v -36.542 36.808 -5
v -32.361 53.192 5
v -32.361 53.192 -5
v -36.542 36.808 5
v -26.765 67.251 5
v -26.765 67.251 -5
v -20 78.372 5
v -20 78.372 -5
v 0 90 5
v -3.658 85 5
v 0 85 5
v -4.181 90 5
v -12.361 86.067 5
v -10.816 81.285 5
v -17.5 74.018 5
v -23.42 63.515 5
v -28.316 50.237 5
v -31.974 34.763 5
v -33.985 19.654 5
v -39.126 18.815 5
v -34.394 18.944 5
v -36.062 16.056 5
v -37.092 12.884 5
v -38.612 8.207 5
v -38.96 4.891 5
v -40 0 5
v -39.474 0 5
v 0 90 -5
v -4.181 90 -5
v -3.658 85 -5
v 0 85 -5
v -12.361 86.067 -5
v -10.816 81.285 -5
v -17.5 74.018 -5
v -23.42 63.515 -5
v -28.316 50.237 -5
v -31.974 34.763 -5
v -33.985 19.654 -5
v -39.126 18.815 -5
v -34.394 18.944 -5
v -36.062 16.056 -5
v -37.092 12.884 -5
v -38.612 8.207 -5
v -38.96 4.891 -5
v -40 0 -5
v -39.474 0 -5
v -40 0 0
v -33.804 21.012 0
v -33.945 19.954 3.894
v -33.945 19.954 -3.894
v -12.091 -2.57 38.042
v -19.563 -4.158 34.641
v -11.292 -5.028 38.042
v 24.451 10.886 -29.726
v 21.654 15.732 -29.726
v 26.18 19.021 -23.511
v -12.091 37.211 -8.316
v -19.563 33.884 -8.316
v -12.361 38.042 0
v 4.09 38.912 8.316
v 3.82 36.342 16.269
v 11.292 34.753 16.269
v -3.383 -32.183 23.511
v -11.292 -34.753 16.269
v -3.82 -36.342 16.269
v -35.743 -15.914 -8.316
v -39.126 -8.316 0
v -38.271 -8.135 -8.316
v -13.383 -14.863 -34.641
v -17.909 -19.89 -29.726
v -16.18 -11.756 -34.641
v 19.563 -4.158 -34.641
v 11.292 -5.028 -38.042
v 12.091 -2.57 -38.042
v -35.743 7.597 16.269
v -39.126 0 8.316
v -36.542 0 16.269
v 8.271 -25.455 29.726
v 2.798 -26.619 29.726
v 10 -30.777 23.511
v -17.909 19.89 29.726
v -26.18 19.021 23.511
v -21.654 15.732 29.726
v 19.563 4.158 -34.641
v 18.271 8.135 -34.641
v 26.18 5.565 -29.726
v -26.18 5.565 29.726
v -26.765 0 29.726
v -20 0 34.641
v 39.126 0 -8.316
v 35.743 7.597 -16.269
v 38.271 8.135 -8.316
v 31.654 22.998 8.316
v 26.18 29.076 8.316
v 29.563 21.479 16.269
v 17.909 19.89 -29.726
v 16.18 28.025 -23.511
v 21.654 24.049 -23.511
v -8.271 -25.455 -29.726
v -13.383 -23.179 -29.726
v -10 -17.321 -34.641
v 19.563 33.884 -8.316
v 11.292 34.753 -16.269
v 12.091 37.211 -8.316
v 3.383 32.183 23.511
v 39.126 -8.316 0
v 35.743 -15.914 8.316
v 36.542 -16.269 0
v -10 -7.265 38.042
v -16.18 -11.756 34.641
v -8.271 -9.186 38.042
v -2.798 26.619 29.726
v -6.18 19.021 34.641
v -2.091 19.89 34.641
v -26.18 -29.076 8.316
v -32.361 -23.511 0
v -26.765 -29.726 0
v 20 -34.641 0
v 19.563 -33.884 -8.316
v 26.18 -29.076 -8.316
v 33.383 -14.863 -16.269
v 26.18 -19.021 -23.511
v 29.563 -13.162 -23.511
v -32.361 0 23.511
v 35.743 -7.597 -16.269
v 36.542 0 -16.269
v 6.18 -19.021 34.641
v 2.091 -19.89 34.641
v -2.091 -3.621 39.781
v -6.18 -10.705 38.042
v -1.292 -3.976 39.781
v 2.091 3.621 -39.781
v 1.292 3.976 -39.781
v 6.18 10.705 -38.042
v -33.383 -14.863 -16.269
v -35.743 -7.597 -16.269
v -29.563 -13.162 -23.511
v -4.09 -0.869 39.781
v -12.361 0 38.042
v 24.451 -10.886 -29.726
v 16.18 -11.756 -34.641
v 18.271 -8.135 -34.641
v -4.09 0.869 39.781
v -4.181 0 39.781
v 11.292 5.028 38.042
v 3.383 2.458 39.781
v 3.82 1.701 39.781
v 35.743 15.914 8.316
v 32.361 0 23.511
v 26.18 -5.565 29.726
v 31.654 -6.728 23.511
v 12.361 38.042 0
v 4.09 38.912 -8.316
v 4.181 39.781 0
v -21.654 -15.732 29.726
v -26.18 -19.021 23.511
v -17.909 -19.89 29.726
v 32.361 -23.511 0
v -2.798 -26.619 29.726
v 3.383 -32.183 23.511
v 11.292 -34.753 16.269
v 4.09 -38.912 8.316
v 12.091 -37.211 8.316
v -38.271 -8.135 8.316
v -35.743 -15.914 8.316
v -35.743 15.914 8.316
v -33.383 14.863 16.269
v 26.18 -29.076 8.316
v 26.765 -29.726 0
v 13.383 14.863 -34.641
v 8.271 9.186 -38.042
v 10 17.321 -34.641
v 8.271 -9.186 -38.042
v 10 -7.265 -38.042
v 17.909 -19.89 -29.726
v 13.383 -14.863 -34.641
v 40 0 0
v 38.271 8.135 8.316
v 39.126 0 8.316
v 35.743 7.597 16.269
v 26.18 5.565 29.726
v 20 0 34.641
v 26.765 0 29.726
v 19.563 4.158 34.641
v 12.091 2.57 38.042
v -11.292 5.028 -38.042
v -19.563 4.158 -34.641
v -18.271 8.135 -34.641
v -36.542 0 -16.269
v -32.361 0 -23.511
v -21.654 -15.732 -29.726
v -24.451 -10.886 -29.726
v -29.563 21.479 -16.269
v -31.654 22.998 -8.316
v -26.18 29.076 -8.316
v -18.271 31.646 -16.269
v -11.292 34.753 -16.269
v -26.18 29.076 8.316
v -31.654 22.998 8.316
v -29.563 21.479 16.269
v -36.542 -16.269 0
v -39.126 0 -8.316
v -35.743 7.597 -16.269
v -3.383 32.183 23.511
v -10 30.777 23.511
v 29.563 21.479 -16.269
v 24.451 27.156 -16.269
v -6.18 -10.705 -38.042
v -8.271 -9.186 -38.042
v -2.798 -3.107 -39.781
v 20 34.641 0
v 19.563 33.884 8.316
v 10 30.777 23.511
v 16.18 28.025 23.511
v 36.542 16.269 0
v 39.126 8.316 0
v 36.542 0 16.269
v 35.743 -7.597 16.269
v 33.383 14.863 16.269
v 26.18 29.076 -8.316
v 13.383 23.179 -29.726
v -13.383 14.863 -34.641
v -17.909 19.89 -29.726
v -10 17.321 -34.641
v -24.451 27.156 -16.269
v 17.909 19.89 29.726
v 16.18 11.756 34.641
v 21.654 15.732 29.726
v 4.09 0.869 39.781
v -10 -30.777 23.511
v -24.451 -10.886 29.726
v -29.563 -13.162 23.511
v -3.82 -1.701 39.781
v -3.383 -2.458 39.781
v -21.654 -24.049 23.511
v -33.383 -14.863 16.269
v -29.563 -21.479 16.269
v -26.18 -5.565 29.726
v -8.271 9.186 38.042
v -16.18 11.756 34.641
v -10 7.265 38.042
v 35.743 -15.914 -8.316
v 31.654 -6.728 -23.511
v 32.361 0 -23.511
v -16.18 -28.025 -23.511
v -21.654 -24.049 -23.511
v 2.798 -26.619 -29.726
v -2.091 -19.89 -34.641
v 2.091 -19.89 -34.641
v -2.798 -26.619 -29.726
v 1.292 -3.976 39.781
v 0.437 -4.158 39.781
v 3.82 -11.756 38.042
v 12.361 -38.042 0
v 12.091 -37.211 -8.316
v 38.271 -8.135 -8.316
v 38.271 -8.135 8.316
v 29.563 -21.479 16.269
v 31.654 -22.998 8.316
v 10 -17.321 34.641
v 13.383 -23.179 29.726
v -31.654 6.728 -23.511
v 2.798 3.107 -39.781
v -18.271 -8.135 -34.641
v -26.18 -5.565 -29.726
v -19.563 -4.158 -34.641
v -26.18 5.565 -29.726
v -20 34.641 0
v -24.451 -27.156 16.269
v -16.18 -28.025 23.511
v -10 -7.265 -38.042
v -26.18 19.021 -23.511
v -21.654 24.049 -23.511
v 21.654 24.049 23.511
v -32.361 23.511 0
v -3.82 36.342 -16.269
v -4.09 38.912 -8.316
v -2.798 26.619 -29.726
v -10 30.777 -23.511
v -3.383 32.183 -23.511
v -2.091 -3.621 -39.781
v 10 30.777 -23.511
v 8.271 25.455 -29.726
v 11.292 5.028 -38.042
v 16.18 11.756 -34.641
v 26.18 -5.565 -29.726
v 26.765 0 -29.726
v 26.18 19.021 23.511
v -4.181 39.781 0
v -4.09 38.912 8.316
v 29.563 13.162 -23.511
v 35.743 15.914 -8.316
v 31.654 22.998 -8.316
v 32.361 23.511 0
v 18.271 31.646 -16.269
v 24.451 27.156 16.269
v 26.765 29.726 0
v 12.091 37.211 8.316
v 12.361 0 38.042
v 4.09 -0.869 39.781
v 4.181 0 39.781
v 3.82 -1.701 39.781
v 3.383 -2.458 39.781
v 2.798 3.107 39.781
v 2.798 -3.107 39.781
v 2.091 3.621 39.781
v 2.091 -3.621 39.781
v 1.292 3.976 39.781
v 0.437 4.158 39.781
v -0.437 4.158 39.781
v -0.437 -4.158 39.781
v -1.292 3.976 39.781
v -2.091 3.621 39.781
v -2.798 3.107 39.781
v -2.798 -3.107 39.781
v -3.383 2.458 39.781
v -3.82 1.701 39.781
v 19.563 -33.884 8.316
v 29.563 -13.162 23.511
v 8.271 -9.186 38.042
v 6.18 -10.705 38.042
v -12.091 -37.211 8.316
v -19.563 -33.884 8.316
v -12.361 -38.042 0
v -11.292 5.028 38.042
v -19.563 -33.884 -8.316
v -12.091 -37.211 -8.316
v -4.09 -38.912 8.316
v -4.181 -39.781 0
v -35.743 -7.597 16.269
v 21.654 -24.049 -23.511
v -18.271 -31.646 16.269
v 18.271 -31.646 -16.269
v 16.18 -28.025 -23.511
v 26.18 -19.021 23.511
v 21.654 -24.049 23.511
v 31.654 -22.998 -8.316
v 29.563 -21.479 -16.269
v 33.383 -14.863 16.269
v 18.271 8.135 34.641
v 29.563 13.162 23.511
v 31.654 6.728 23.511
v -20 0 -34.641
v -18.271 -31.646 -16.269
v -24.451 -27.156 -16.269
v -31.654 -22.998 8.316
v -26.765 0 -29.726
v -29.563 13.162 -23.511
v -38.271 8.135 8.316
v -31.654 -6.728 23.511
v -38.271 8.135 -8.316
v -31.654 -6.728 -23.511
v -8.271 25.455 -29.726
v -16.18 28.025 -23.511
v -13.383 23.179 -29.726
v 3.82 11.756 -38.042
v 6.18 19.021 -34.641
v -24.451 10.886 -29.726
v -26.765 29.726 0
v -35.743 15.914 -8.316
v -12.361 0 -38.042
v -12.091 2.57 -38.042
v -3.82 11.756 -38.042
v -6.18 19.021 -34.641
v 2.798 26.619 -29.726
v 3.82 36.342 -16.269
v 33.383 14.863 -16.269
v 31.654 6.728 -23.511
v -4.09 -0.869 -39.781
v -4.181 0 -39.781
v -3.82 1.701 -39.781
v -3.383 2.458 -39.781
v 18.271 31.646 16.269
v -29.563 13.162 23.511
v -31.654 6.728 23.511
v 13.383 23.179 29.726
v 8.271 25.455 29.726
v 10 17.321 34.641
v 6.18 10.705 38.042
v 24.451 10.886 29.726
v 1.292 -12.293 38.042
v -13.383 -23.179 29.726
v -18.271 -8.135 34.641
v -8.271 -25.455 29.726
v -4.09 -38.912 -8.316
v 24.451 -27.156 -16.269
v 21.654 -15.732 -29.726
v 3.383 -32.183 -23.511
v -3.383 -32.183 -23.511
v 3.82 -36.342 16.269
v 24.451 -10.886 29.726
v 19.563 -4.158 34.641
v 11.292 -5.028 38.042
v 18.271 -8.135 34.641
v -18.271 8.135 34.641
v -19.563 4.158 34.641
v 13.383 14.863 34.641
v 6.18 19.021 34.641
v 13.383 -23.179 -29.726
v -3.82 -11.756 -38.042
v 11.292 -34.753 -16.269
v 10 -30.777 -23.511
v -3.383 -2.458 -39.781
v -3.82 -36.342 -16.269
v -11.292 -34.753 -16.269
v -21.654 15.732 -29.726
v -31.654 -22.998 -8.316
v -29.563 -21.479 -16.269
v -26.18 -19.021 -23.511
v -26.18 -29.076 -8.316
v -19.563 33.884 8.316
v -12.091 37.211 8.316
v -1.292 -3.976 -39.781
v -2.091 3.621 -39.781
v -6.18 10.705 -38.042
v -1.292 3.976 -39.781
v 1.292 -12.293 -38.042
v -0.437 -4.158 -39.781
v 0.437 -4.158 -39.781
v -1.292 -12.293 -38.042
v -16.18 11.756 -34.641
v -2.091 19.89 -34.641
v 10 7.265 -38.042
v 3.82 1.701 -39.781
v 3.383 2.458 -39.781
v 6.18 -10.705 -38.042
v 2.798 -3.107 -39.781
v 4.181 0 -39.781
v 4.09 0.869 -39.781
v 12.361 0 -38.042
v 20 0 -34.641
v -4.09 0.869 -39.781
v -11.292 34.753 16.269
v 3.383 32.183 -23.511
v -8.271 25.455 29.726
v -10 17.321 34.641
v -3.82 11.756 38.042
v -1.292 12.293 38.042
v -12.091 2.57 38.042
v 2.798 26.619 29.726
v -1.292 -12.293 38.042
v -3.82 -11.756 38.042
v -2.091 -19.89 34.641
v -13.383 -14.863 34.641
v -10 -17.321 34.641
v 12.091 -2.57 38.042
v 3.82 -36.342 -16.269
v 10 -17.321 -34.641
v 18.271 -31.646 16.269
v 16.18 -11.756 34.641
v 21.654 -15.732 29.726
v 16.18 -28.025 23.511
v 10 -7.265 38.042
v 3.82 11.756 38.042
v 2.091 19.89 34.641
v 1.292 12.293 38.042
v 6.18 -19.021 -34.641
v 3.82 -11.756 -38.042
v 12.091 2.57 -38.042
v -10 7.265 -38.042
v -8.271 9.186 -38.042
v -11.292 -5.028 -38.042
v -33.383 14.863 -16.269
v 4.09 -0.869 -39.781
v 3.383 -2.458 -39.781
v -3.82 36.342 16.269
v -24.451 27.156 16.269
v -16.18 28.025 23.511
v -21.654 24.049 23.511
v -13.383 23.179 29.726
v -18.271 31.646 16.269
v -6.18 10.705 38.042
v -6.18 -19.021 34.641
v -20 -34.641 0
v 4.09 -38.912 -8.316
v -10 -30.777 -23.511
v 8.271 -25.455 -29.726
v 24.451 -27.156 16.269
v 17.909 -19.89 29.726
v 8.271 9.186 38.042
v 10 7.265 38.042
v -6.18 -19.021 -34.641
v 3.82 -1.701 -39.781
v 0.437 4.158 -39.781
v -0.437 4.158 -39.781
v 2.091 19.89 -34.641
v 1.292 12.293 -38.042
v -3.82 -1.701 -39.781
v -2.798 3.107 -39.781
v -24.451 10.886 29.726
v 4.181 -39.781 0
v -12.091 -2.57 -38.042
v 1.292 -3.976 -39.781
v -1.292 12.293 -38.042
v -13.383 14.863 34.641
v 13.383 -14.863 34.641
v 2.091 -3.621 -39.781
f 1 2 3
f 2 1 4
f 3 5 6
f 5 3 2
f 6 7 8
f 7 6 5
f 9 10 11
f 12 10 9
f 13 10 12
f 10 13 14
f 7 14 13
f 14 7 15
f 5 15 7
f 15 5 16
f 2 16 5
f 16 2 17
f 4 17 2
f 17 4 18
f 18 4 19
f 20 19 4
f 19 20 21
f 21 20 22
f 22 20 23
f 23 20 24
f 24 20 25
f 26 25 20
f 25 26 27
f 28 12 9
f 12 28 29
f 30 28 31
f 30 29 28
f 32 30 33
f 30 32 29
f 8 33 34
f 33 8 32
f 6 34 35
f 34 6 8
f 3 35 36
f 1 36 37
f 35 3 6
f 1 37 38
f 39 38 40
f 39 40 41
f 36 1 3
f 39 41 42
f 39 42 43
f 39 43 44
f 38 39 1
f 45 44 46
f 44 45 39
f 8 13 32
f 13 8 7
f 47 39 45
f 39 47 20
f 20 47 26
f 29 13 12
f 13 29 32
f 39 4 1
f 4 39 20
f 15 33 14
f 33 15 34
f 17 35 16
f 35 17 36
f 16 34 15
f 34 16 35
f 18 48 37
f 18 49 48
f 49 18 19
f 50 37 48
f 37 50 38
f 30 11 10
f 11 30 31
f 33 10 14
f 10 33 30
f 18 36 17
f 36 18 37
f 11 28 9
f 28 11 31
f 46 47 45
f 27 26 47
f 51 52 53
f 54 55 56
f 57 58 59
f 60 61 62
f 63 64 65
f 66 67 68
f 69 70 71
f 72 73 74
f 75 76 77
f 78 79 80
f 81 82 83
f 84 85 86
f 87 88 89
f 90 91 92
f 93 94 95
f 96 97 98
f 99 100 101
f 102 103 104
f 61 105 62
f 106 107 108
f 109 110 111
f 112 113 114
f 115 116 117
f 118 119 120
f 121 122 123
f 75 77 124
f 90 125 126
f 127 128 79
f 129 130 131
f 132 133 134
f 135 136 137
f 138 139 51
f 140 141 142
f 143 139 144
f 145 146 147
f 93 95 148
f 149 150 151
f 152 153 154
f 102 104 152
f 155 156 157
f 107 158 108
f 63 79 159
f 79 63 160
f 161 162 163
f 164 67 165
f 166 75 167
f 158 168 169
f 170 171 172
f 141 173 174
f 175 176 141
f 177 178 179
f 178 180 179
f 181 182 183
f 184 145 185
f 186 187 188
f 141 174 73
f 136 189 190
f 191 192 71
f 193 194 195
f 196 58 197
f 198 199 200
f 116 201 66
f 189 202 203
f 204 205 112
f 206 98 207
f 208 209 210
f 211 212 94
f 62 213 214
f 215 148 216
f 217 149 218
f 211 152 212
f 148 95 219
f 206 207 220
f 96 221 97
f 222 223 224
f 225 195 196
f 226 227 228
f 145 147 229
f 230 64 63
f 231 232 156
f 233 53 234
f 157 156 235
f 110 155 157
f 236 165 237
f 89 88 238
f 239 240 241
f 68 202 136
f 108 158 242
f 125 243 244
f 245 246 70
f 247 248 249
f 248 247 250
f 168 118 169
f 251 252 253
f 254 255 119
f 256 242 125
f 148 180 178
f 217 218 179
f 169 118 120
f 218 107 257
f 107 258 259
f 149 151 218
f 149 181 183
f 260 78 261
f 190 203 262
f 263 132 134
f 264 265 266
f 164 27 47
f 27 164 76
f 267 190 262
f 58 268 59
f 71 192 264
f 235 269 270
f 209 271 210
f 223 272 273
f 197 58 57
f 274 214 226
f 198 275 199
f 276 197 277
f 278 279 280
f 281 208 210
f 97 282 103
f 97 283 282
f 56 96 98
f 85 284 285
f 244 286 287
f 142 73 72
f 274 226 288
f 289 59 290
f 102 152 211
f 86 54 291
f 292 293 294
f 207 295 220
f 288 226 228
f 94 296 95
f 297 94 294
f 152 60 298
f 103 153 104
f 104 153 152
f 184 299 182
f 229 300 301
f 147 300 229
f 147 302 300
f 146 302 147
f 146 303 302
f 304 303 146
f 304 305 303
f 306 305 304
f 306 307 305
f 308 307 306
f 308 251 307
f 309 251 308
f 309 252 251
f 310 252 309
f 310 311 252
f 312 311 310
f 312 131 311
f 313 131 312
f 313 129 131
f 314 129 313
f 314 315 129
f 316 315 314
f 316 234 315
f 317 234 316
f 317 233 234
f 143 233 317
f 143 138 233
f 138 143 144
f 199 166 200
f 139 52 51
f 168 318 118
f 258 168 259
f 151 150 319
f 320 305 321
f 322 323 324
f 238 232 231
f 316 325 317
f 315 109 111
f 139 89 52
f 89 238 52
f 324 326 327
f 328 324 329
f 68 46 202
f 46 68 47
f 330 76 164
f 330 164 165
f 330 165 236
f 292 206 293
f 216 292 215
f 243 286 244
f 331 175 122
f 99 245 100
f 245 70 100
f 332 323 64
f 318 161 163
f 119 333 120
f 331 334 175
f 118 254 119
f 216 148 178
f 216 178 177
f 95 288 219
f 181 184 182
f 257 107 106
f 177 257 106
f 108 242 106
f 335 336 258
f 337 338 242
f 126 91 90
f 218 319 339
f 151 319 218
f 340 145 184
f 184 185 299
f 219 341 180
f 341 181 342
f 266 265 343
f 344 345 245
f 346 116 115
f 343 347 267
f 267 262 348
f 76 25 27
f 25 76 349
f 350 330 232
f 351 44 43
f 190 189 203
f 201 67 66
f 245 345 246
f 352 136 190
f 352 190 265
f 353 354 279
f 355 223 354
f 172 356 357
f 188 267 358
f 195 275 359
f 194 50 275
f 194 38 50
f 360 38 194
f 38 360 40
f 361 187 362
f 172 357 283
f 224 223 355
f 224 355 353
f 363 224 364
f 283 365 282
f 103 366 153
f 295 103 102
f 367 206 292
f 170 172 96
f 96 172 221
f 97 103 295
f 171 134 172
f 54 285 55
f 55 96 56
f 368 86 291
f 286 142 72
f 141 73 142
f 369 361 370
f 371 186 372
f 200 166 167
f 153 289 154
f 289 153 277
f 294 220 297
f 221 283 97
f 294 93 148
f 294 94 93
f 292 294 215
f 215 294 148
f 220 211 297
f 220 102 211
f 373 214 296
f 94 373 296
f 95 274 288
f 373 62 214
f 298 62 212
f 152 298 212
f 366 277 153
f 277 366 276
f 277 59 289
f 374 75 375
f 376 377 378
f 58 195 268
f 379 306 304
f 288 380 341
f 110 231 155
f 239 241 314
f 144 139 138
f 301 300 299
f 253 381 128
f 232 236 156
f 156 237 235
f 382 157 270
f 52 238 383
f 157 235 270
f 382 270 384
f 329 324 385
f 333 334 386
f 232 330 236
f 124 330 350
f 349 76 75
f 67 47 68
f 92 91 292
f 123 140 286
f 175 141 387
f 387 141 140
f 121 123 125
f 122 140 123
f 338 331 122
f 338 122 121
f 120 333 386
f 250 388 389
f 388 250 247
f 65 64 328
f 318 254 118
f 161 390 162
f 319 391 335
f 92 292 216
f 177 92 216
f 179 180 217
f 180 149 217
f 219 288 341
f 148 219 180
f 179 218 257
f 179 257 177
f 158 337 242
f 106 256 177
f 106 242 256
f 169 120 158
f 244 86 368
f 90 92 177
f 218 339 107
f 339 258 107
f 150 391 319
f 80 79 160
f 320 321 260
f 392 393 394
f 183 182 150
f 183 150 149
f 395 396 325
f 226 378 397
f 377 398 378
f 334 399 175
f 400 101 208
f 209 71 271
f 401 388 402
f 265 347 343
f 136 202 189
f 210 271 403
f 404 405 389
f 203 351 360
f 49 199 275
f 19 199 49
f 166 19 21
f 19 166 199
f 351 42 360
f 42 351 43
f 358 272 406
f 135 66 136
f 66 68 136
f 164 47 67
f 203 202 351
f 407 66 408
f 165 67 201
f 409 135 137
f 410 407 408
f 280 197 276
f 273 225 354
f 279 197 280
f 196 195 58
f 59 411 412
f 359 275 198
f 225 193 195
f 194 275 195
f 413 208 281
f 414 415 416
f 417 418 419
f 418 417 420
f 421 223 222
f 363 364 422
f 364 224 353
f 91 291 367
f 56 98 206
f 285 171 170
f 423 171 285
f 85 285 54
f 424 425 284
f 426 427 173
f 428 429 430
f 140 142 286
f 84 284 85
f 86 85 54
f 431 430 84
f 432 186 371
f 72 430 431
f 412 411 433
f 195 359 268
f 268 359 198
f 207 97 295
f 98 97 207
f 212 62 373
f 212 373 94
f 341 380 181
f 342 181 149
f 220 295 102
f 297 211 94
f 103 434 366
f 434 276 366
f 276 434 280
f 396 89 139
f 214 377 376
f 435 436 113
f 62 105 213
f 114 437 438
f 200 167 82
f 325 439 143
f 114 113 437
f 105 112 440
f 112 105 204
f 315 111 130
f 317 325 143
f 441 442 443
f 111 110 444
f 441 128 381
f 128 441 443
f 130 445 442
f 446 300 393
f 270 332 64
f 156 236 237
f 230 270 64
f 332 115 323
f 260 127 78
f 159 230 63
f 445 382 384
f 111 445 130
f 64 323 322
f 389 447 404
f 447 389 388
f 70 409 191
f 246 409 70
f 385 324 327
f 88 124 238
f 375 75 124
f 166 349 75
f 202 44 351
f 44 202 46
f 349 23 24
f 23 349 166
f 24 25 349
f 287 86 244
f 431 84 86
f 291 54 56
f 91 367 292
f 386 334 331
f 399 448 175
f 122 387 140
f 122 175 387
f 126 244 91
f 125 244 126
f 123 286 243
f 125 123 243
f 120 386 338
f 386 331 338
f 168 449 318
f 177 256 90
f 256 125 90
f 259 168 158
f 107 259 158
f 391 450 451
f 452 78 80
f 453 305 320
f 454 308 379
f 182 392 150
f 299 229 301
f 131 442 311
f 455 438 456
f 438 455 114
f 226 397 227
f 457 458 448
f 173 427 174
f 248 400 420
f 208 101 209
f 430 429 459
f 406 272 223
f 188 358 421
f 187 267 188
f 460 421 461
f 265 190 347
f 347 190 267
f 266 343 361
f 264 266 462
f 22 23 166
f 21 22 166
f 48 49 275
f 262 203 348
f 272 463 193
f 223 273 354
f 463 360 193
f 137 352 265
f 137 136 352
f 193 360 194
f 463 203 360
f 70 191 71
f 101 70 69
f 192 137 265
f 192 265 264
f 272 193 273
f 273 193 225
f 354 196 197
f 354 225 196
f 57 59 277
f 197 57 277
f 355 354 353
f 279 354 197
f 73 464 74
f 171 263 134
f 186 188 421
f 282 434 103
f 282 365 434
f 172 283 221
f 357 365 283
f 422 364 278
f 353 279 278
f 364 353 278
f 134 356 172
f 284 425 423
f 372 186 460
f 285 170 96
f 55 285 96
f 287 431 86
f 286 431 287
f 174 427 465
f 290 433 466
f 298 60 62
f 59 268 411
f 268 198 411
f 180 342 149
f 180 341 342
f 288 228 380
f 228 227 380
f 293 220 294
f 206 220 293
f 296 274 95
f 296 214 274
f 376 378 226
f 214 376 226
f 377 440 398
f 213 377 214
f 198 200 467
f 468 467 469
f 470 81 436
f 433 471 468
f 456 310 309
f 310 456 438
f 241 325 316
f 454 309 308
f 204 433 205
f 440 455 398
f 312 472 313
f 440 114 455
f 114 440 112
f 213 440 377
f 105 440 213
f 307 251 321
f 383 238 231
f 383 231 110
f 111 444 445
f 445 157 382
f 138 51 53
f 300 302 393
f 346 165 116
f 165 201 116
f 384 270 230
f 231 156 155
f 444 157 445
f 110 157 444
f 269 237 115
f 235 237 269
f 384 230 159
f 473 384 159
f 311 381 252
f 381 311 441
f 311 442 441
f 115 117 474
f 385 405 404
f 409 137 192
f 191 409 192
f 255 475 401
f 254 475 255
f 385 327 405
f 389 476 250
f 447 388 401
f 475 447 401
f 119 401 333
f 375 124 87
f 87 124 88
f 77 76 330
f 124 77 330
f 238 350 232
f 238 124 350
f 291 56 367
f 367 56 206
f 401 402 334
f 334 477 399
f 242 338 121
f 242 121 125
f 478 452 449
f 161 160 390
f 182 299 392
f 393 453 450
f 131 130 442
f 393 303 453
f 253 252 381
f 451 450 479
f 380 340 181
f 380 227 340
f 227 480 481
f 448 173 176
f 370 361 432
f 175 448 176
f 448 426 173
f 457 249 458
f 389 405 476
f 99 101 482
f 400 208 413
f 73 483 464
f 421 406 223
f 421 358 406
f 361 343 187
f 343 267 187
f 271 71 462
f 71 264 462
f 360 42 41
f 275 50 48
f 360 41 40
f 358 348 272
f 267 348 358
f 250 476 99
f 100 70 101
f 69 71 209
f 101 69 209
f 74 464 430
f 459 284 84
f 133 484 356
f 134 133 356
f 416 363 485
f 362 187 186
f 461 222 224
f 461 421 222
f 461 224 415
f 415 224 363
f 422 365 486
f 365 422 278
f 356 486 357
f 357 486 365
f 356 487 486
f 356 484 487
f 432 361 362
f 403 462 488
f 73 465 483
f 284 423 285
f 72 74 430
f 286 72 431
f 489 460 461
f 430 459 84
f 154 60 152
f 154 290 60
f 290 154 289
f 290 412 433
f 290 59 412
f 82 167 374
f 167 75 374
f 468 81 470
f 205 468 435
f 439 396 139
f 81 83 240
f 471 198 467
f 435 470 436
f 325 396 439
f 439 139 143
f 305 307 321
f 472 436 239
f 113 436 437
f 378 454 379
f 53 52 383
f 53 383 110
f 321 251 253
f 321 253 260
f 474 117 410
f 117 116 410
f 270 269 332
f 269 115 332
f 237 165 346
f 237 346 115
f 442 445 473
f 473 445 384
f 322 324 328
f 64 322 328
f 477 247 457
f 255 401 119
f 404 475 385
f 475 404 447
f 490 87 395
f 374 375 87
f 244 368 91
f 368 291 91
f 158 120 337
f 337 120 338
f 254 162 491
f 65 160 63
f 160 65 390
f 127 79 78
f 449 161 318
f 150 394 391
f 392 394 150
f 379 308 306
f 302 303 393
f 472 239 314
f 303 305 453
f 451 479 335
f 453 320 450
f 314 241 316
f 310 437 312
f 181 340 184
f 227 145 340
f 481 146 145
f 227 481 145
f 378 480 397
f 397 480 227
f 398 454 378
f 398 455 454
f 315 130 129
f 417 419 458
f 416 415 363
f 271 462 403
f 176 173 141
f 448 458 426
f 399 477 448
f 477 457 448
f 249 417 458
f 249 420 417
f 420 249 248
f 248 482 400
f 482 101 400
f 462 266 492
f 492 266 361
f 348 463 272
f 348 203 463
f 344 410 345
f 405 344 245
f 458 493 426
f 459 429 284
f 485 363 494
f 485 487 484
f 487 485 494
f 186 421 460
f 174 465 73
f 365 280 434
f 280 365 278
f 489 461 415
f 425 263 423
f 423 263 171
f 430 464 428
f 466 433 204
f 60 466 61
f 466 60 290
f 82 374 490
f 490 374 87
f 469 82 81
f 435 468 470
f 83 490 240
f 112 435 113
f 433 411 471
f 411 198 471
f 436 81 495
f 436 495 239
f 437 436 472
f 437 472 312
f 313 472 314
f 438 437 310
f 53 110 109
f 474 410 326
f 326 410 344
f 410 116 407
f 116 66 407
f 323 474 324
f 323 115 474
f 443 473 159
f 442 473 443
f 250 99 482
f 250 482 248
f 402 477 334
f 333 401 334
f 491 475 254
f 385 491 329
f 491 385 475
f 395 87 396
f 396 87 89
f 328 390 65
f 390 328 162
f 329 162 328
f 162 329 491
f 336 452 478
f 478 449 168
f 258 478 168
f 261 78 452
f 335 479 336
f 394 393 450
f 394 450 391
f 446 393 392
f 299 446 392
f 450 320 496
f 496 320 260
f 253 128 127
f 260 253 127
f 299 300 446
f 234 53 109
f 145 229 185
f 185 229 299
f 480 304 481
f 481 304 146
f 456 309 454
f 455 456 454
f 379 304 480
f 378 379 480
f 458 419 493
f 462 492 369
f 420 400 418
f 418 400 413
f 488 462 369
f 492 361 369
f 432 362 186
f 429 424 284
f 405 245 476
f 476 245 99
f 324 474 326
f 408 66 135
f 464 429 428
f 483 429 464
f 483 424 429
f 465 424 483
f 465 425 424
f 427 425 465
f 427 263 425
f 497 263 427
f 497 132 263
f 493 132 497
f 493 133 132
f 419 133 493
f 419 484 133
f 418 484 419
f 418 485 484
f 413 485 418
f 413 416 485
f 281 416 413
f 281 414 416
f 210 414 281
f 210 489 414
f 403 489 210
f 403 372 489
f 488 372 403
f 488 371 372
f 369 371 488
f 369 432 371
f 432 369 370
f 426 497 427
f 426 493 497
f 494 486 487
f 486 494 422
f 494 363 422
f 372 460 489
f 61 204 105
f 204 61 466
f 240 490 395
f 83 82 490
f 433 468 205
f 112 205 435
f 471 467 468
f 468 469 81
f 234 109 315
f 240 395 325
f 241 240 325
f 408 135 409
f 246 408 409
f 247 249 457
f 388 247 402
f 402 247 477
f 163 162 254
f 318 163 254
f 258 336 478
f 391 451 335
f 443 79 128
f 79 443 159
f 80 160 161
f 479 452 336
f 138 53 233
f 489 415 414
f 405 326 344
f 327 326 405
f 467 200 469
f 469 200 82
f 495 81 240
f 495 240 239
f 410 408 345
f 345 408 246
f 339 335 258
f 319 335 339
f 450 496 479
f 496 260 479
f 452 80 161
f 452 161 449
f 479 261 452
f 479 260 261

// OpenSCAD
//radius of sphere
r=40;
//Thickness of finger
a=10;
//Reach of Finger Past Sphere
b=100;

difference(){
union(){
sphere(r=r,center=true);

difference(){
resize(newsize=[r*2,(r*2)+b,a])
    cylinder(a,r=r,center=true);
resize(newsize=[r*2-a,(r*2)+b-a,a+1])
    cylinder(a+1,r=r-(a/2),center=true);
translate([r*3,0,0])
    cube(r*6,center=true);
translate([0,-r*2,0])
    cube(r*4,center=true);
}
}
//Un-Comment to make halves for printing
//translate([0,0,-r*5])
    //cube(r*10,center=true);
}
